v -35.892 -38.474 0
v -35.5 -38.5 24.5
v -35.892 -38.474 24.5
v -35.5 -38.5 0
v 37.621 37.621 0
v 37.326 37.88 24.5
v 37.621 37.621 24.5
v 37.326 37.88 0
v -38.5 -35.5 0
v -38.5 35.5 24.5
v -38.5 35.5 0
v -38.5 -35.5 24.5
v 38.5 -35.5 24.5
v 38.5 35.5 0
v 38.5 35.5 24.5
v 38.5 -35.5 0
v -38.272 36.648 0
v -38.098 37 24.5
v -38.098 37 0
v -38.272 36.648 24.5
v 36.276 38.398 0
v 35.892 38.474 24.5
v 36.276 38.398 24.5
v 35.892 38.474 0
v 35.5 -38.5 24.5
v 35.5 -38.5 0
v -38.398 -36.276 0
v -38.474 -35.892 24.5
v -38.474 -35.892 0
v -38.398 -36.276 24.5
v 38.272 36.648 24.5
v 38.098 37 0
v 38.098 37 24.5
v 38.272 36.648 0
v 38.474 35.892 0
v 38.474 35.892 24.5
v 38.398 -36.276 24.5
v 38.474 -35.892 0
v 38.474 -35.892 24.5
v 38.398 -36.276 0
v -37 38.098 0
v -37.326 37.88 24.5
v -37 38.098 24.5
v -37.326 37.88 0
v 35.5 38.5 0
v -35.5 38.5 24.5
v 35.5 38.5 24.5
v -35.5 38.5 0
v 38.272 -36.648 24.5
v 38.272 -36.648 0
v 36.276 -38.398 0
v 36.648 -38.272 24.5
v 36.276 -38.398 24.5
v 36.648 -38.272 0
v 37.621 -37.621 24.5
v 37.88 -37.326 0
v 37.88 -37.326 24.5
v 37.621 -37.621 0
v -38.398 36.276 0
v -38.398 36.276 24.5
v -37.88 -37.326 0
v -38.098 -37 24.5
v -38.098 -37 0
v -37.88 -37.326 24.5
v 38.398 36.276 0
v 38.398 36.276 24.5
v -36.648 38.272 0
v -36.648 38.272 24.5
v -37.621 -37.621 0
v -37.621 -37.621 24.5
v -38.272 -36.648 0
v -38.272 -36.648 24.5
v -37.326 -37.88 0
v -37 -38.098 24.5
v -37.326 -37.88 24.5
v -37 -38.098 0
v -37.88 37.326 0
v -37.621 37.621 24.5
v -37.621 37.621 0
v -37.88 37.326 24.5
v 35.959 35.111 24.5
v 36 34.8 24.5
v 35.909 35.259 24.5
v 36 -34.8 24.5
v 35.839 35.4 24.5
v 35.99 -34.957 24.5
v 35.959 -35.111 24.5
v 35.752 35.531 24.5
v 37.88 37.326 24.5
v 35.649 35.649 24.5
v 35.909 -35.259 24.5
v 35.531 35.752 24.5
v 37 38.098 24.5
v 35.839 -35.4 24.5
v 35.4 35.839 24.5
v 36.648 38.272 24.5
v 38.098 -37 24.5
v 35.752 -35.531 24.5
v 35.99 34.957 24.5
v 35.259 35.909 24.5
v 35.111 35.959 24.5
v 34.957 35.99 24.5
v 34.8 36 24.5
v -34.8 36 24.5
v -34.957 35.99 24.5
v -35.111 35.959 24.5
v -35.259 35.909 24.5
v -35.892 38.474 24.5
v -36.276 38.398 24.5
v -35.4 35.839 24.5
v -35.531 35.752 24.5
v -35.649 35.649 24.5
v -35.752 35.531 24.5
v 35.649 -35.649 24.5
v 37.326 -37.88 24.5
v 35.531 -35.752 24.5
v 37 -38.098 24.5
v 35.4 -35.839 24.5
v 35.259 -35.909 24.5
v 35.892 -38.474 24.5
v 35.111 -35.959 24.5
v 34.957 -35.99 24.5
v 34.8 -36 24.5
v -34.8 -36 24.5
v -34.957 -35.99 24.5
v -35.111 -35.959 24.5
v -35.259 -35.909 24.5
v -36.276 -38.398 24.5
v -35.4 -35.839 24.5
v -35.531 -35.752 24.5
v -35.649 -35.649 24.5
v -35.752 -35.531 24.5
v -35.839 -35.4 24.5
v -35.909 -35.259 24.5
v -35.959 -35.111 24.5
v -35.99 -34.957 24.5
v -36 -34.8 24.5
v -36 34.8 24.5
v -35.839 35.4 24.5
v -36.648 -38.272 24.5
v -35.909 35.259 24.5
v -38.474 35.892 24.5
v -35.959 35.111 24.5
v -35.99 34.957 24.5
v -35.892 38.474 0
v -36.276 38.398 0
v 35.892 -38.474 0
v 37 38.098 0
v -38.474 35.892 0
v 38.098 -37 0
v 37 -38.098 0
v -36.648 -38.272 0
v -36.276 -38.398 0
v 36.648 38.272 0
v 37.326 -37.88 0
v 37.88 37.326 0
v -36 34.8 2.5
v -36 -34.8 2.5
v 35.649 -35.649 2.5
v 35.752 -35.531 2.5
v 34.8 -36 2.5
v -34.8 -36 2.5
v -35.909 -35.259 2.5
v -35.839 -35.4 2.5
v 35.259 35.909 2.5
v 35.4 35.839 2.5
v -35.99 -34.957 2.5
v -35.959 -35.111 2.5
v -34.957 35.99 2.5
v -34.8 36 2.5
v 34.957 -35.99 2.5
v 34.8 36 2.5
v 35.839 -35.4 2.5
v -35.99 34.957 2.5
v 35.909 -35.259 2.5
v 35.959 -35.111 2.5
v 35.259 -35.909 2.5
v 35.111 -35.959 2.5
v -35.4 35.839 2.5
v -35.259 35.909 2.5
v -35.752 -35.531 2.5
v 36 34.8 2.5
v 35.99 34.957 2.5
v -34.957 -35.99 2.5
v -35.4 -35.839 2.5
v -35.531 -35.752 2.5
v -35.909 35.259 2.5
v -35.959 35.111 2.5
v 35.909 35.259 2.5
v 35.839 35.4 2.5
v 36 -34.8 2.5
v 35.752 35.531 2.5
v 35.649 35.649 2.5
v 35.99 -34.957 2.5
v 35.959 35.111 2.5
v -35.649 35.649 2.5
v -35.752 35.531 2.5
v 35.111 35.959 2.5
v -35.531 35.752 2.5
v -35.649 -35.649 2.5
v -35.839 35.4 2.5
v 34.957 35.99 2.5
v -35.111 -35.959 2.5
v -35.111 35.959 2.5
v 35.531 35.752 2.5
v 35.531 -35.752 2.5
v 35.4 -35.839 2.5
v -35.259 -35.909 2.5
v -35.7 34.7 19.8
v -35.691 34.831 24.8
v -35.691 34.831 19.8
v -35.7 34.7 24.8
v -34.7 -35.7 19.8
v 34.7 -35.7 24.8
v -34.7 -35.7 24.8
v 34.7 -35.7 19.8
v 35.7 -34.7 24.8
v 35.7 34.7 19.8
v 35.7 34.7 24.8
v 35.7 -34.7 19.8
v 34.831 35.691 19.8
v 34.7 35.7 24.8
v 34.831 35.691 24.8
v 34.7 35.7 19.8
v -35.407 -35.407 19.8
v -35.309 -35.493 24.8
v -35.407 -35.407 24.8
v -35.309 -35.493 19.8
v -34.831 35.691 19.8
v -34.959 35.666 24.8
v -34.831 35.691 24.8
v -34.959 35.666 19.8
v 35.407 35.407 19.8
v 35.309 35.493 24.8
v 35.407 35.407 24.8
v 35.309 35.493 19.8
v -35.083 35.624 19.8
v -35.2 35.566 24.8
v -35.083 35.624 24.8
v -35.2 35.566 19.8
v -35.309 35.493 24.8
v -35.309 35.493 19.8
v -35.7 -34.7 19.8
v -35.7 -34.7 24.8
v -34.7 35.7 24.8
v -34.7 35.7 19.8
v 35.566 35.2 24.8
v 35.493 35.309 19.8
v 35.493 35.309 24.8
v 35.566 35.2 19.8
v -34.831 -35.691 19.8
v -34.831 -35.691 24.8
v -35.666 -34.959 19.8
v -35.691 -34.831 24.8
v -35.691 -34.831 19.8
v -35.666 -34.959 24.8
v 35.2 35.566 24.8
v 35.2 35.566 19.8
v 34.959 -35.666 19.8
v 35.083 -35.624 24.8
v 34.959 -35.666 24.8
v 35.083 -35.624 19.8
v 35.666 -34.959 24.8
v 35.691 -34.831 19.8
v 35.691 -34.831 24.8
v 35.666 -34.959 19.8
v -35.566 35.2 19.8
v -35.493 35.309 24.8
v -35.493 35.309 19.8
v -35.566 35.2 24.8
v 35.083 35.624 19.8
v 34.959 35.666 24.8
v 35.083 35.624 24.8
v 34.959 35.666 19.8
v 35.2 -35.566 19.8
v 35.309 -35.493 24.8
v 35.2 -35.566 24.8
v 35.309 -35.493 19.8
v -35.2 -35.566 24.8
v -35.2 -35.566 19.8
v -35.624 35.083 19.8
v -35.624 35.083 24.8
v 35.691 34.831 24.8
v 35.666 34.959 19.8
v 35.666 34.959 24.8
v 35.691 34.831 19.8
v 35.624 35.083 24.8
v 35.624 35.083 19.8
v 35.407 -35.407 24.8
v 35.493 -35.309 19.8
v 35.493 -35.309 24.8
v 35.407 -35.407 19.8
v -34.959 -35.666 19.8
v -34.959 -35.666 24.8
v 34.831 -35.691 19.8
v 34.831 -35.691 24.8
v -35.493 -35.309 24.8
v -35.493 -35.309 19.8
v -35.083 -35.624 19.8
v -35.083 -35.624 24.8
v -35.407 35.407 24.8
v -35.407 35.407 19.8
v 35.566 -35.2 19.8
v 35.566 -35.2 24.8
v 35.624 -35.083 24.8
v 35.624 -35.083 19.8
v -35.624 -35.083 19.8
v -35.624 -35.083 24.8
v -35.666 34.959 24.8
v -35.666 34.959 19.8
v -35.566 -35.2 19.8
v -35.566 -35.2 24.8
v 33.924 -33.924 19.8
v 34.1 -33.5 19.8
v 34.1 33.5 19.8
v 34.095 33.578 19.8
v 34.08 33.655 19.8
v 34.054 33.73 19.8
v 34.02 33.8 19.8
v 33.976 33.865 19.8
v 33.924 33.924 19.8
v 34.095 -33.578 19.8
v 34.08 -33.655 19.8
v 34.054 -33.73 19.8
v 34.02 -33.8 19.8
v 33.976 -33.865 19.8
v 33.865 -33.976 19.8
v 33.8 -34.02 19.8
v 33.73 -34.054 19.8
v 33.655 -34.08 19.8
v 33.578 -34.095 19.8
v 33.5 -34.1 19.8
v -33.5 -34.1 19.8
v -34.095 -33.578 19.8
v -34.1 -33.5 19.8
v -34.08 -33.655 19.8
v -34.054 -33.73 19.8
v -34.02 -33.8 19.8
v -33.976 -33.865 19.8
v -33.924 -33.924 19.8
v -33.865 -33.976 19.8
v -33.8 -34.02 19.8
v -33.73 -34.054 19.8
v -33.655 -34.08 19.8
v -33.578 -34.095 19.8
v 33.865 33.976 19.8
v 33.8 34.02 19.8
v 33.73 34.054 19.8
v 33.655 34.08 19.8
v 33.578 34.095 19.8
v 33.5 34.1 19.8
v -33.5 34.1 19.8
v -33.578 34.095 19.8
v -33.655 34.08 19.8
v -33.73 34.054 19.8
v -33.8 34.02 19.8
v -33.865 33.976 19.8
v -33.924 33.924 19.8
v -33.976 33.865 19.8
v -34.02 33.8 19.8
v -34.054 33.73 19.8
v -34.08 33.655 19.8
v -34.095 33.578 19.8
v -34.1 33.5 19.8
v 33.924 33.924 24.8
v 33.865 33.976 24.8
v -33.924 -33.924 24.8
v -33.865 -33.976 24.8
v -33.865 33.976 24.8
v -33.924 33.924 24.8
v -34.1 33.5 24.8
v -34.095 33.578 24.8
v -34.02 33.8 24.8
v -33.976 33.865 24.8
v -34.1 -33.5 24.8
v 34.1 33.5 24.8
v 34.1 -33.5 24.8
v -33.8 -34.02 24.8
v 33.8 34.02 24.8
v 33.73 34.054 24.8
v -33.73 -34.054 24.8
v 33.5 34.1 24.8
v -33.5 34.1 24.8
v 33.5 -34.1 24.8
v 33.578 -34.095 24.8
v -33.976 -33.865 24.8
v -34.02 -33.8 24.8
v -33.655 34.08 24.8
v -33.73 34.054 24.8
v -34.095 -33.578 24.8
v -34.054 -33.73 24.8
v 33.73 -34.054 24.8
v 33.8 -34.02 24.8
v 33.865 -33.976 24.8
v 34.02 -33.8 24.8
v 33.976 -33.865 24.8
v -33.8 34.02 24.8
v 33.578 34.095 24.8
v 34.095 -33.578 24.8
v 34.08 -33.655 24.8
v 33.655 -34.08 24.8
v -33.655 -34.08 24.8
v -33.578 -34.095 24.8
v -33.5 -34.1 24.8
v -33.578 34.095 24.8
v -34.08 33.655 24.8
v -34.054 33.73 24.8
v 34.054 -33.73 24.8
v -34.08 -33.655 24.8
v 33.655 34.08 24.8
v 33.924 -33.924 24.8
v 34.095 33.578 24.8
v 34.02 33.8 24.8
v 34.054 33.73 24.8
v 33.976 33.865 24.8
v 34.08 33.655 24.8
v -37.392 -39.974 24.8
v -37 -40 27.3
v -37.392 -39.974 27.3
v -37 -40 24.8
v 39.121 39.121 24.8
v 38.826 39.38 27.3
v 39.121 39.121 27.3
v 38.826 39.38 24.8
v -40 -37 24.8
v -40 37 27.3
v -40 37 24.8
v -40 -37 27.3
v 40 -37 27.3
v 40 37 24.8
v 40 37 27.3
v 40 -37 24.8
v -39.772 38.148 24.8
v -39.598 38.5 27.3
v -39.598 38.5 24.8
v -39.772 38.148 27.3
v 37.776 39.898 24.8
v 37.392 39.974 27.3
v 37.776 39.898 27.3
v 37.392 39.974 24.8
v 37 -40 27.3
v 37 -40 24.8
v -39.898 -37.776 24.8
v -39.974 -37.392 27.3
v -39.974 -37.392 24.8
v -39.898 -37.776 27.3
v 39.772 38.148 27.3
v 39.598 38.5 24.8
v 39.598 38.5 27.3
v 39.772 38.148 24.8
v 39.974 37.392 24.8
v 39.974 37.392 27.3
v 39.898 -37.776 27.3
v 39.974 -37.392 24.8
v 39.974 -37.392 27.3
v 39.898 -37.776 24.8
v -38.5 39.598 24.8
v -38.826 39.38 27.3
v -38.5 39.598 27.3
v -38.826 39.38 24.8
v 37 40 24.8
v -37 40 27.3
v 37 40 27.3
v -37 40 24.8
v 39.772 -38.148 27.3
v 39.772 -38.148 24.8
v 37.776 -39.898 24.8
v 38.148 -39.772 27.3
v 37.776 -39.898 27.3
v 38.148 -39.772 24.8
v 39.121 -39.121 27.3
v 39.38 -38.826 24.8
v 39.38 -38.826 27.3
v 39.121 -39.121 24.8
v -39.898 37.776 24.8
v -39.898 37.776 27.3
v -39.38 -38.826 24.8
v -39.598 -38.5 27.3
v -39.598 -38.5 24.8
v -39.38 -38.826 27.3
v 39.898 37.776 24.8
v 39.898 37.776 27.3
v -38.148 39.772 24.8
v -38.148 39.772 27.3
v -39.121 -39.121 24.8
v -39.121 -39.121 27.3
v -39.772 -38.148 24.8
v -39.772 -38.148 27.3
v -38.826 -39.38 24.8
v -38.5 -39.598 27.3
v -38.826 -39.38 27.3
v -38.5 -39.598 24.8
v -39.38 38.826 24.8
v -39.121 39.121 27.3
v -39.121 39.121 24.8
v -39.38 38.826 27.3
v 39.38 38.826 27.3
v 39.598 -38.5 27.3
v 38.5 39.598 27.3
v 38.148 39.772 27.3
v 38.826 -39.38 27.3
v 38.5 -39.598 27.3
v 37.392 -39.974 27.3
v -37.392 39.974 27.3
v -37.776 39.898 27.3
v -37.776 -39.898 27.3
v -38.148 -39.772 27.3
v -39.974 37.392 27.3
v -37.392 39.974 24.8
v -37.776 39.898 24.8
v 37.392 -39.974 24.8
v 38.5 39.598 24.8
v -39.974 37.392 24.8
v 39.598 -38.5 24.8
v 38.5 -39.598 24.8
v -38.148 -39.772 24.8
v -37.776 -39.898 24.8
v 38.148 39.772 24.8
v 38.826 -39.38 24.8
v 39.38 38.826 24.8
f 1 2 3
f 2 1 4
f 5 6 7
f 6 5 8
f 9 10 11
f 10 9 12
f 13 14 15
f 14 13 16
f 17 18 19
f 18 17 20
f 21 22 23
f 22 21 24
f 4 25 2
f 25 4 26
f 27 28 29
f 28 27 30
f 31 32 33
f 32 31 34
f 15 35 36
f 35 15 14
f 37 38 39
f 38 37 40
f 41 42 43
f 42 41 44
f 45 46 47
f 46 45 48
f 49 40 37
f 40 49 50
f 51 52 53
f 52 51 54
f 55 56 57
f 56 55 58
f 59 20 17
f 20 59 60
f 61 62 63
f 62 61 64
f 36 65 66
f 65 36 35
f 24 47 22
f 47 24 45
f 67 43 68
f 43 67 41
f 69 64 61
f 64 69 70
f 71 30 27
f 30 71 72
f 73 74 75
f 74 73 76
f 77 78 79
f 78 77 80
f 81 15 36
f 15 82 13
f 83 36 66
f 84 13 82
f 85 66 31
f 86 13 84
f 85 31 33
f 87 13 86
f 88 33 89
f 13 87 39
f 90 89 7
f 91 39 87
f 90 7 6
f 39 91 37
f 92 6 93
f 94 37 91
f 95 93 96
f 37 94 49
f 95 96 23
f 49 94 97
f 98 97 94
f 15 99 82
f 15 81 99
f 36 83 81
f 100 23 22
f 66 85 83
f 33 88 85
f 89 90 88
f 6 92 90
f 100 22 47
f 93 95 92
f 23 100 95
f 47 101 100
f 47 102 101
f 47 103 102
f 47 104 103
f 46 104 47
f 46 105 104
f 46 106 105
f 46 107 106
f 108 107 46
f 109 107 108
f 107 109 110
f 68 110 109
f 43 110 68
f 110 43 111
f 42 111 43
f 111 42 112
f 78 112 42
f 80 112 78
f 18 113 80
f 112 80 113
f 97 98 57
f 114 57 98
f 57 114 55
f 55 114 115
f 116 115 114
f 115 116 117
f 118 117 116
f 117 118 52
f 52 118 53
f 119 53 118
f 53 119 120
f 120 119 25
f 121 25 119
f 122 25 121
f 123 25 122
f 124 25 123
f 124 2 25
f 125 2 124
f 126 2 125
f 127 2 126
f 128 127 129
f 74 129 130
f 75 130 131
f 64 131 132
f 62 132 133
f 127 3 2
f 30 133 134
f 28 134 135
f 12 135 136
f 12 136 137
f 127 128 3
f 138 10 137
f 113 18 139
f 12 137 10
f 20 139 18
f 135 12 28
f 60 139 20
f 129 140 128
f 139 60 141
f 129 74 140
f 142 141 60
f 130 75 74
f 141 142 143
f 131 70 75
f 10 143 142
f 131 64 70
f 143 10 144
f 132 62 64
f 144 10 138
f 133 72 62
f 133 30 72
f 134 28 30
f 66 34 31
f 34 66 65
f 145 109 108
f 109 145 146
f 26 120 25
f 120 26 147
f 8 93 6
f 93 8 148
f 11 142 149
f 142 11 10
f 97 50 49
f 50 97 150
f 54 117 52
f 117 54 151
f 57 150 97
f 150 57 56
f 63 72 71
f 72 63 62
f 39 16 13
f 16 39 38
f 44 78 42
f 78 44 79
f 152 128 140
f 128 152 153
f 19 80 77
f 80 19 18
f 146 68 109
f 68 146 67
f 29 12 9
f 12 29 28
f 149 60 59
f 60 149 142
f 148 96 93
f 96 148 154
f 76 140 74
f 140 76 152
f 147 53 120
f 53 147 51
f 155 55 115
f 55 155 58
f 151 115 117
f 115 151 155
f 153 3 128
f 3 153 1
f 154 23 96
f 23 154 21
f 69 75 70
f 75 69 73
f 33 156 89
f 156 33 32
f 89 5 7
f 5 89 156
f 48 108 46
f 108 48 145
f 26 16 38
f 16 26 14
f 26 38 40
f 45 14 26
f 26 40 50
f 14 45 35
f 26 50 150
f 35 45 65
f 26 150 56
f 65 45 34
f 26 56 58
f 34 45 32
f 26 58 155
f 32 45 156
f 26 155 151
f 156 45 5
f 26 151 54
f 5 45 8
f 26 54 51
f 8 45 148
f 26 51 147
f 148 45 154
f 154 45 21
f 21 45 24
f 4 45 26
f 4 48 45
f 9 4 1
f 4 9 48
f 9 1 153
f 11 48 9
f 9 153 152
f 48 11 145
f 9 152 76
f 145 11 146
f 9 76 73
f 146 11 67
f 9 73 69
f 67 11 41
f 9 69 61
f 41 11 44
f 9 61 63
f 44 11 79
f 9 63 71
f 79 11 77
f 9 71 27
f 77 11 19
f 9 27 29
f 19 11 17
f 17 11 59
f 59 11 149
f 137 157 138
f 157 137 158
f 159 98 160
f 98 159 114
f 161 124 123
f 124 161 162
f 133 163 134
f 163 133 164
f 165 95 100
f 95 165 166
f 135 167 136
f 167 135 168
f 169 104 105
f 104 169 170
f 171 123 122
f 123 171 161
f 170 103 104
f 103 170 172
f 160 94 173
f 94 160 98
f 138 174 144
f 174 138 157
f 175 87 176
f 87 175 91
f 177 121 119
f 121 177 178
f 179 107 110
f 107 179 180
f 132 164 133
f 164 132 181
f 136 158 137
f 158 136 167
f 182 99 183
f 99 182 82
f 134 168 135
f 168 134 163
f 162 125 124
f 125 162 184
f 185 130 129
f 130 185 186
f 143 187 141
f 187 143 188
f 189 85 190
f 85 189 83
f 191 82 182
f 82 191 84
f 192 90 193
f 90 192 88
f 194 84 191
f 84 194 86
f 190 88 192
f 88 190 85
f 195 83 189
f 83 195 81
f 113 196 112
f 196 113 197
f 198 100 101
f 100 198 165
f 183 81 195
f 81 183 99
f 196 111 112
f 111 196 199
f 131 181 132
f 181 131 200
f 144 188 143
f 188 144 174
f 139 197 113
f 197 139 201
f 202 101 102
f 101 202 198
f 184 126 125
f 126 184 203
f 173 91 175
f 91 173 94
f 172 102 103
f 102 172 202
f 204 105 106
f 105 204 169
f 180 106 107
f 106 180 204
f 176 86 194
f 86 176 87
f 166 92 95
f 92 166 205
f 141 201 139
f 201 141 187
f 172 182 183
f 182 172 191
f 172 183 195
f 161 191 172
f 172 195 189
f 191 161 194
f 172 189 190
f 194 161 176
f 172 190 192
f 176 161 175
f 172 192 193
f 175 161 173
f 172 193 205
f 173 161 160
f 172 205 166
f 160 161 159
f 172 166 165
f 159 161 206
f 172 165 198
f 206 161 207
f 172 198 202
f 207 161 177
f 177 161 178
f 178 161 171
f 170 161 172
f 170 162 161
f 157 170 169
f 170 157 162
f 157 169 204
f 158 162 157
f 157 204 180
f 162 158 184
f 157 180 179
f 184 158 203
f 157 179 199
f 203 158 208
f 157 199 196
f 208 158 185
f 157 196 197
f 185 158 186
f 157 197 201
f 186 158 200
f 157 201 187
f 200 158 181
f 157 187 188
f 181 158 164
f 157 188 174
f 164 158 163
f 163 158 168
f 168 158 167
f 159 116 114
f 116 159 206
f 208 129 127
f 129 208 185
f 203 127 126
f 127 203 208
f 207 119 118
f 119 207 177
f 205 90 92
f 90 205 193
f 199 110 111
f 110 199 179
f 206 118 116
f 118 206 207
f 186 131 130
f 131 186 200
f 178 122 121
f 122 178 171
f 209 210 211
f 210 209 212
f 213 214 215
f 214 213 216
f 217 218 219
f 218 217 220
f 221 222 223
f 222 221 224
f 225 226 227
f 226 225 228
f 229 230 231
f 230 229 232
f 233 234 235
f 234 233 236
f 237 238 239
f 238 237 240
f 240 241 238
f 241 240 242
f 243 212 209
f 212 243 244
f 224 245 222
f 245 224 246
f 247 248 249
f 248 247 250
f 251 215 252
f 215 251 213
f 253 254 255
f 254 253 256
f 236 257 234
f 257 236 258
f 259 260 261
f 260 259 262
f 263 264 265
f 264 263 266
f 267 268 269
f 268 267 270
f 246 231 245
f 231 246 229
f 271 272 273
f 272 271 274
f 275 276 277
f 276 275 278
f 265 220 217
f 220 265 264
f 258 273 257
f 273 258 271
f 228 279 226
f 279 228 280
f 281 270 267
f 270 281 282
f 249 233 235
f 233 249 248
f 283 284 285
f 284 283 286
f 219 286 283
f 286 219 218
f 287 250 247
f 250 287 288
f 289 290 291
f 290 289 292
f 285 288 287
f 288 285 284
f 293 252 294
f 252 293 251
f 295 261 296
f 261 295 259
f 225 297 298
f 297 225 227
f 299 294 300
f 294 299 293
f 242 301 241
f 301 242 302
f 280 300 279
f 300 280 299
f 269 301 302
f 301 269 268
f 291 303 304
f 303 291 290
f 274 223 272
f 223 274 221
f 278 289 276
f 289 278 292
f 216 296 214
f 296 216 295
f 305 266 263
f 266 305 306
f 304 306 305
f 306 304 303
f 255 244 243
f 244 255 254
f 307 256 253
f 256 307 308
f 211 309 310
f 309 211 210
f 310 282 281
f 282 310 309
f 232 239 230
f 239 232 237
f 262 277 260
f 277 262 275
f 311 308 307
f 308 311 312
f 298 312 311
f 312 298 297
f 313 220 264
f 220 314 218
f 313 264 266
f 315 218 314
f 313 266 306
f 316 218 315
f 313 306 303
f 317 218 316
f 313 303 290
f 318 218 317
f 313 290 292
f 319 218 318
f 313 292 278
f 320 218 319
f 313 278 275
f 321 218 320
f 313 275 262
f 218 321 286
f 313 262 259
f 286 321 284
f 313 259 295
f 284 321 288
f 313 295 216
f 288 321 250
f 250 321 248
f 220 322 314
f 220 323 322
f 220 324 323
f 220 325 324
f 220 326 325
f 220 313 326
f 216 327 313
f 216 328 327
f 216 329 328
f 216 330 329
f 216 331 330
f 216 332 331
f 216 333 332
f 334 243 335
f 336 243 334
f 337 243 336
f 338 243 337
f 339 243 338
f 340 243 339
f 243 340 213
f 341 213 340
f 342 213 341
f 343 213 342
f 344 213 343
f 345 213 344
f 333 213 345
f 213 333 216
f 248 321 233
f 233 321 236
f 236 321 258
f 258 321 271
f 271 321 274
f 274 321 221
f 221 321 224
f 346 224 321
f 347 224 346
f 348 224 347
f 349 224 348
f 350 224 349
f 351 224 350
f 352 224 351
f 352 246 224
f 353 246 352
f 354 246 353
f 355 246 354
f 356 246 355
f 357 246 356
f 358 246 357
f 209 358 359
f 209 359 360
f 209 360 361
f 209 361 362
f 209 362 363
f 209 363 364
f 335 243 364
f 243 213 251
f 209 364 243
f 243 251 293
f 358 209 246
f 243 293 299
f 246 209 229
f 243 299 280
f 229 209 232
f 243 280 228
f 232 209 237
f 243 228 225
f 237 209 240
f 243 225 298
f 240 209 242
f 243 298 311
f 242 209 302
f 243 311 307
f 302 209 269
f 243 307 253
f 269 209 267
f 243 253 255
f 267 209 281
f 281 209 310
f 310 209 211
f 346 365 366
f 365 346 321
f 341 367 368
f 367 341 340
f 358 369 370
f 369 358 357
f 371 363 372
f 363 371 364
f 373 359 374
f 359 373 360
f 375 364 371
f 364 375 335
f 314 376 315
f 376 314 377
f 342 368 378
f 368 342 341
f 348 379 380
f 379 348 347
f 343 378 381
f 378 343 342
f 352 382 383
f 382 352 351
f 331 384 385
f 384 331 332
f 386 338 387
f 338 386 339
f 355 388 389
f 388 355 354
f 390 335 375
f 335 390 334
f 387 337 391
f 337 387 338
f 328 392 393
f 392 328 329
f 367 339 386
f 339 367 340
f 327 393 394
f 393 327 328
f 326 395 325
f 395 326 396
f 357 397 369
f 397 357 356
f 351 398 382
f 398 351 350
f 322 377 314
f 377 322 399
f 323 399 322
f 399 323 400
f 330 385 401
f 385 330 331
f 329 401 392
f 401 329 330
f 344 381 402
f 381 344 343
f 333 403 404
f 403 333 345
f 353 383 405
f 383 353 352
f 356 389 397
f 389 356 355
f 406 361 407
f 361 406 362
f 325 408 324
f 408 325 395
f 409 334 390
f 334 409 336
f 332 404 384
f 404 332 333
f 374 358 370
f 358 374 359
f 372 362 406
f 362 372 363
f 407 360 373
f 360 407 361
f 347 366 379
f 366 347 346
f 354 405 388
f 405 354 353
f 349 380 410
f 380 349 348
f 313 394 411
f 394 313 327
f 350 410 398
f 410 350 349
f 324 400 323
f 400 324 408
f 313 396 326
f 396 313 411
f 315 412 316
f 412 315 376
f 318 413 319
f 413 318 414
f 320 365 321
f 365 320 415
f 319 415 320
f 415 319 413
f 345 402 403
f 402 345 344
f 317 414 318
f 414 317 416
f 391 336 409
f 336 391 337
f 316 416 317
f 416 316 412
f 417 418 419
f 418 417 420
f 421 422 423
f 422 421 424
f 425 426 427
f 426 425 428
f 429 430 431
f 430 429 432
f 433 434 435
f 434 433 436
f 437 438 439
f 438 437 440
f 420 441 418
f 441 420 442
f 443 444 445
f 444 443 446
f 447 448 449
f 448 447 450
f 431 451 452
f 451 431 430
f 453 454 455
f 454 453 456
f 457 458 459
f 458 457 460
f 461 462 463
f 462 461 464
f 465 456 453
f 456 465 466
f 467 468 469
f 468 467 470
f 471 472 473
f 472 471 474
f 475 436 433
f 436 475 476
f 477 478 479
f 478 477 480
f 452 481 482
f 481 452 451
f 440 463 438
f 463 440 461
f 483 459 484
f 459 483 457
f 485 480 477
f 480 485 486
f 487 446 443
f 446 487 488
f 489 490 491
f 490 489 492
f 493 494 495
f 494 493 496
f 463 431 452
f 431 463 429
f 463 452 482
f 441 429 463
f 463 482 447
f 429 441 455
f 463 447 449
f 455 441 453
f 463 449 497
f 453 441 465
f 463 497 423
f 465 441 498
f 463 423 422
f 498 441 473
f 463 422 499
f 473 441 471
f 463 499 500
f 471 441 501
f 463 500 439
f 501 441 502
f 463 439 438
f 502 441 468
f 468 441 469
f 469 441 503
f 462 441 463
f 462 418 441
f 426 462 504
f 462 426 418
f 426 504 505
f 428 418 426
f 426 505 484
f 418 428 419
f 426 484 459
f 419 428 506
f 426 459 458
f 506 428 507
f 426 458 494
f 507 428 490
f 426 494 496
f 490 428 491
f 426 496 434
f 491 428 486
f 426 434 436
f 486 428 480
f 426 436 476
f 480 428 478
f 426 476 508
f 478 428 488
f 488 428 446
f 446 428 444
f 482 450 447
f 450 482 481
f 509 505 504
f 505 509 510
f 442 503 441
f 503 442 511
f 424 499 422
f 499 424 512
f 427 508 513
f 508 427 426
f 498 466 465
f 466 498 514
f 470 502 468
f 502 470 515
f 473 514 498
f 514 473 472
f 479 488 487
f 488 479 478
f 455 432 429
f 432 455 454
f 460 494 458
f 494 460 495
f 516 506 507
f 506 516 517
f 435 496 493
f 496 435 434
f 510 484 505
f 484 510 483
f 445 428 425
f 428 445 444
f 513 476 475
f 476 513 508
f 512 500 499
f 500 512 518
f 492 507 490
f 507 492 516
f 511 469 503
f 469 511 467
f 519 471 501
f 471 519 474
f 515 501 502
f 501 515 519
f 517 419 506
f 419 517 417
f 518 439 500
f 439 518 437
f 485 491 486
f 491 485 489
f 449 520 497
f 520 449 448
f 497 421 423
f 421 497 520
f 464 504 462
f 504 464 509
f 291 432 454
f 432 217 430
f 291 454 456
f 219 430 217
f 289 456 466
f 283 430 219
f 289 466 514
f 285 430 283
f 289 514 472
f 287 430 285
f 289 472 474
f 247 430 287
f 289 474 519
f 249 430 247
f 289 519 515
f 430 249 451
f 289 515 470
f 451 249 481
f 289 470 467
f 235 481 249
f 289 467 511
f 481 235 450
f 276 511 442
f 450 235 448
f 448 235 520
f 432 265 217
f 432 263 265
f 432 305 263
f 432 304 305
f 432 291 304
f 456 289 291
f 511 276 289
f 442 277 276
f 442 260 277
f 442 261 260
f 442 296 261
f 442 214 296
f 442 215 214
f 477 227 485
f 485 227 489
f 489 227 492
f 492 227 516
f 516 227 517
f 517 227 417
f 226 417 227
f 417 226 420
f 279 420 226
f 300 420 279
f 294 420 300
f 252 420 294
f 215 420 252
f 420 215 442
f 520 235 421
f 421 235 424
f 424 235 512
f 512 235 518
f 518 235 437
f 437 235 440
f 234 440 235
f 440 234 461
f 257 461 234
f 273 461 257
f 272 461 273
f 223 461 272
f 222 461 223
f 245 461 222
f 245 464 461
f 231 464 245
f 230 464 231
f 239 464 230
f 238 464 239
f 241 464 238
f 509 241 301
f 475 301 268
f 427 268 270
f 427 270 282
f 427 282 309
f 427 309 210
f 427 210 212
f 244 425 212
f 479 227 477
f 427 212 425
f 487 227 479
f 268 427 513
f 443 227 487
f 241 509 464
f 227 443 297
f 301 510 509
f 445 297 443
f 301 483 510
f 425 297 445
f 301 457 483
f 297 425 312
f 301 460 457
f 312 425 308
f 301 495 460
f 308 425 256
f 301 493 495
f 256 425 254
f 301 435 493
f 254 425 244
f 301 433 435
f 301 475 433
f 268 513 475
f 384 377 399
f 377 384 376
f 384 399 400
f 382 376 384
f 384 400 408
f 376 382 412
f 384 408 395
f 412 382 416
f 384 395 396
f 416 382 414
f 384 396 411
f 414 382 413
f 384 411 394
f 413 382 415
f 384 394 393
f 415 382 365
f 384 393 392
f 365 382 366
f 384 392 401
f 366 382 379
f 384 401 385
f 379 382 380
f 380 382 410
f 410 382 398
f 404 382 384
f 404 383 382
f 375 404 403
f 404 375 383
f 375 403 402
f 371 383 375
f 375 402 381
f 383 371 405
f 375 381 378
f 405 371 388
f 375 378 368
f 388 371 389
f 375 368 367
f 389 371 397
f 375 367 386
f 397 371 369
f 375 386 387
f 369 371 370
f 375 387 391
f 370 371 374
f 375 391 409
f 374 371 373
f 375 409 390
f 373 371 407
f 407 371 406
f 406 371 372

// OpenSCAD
$fn = 48;

// Units: mm
wall = 2.5;
clearance = 0.30;

cavity_x = 72;
cavity_y = 72;
cavity_z = 22;

floor_thickness = wall;
base_wall_height = cavity_z;
base_outer_x = cavity_x + 2 * wall;
base_outer_y = cavity_y + 2 * wall;
base_outer_z = floor_thickness + base_wall_height;

lid_top_thickness = wall;
lid_overhang = 1.5;
lid_outer_x = base_outer_x + 2 * lid_overhang;
lid_outer_y = base_outer_y + 2 * lid_overhang;
lid_outer_z = lid_top_thickness;

skirt_wall = 1.6;
skirt_depth = 5.0;
skirt_outer_x = cavity_x - 2 * clearance;
skirt_outer_y = cavity_y - 2 * clearance;
skirt_inner_x = skirt_outer_x - 2 * skirt_wall;
skirt_inner_y = skirt_outer_y - 2 * skirt_wall;

lid_z = base_outer_z + clearance;

module rounded_box(size, r) {
    hull() {
        for (x = [-size[0] / 2 + r, size[0] / 2 - r])
        for (y = [-size[1] / 2 + r, size[1] / 2 - r])
            translate([x, y, 0])
                cylinder(h = size[2], r = r);
    }
}

module base() {
    difference() {
        rounded_box([base_outer_x, base_outer_y, base_outer_z], 3.0);

        translate([0, 0, floor_thickness])
            rounded_box([cavity_x, cavity_y, base_wall_height + 0.2], 1.2);
    }
}

module lid() {
    union() {
        translate([0, 0, lid_z])
            rounded_box([lid_outer_x, lid_outer_y, lid_outer_z], 3.0);

        translate([0, 0, lid_z - skirt_depth])
            difference() {
                rounded_box([skirt_outer_x, skirt_outer_y, skirt_depth], 1.0);

                translate([0, 0, -0.1])
                    rounded_box([skirt_inner_x, skirt_inner_y, skirt_depth + 0.2], 0.6);
            }
    }
}

base();
lid();
